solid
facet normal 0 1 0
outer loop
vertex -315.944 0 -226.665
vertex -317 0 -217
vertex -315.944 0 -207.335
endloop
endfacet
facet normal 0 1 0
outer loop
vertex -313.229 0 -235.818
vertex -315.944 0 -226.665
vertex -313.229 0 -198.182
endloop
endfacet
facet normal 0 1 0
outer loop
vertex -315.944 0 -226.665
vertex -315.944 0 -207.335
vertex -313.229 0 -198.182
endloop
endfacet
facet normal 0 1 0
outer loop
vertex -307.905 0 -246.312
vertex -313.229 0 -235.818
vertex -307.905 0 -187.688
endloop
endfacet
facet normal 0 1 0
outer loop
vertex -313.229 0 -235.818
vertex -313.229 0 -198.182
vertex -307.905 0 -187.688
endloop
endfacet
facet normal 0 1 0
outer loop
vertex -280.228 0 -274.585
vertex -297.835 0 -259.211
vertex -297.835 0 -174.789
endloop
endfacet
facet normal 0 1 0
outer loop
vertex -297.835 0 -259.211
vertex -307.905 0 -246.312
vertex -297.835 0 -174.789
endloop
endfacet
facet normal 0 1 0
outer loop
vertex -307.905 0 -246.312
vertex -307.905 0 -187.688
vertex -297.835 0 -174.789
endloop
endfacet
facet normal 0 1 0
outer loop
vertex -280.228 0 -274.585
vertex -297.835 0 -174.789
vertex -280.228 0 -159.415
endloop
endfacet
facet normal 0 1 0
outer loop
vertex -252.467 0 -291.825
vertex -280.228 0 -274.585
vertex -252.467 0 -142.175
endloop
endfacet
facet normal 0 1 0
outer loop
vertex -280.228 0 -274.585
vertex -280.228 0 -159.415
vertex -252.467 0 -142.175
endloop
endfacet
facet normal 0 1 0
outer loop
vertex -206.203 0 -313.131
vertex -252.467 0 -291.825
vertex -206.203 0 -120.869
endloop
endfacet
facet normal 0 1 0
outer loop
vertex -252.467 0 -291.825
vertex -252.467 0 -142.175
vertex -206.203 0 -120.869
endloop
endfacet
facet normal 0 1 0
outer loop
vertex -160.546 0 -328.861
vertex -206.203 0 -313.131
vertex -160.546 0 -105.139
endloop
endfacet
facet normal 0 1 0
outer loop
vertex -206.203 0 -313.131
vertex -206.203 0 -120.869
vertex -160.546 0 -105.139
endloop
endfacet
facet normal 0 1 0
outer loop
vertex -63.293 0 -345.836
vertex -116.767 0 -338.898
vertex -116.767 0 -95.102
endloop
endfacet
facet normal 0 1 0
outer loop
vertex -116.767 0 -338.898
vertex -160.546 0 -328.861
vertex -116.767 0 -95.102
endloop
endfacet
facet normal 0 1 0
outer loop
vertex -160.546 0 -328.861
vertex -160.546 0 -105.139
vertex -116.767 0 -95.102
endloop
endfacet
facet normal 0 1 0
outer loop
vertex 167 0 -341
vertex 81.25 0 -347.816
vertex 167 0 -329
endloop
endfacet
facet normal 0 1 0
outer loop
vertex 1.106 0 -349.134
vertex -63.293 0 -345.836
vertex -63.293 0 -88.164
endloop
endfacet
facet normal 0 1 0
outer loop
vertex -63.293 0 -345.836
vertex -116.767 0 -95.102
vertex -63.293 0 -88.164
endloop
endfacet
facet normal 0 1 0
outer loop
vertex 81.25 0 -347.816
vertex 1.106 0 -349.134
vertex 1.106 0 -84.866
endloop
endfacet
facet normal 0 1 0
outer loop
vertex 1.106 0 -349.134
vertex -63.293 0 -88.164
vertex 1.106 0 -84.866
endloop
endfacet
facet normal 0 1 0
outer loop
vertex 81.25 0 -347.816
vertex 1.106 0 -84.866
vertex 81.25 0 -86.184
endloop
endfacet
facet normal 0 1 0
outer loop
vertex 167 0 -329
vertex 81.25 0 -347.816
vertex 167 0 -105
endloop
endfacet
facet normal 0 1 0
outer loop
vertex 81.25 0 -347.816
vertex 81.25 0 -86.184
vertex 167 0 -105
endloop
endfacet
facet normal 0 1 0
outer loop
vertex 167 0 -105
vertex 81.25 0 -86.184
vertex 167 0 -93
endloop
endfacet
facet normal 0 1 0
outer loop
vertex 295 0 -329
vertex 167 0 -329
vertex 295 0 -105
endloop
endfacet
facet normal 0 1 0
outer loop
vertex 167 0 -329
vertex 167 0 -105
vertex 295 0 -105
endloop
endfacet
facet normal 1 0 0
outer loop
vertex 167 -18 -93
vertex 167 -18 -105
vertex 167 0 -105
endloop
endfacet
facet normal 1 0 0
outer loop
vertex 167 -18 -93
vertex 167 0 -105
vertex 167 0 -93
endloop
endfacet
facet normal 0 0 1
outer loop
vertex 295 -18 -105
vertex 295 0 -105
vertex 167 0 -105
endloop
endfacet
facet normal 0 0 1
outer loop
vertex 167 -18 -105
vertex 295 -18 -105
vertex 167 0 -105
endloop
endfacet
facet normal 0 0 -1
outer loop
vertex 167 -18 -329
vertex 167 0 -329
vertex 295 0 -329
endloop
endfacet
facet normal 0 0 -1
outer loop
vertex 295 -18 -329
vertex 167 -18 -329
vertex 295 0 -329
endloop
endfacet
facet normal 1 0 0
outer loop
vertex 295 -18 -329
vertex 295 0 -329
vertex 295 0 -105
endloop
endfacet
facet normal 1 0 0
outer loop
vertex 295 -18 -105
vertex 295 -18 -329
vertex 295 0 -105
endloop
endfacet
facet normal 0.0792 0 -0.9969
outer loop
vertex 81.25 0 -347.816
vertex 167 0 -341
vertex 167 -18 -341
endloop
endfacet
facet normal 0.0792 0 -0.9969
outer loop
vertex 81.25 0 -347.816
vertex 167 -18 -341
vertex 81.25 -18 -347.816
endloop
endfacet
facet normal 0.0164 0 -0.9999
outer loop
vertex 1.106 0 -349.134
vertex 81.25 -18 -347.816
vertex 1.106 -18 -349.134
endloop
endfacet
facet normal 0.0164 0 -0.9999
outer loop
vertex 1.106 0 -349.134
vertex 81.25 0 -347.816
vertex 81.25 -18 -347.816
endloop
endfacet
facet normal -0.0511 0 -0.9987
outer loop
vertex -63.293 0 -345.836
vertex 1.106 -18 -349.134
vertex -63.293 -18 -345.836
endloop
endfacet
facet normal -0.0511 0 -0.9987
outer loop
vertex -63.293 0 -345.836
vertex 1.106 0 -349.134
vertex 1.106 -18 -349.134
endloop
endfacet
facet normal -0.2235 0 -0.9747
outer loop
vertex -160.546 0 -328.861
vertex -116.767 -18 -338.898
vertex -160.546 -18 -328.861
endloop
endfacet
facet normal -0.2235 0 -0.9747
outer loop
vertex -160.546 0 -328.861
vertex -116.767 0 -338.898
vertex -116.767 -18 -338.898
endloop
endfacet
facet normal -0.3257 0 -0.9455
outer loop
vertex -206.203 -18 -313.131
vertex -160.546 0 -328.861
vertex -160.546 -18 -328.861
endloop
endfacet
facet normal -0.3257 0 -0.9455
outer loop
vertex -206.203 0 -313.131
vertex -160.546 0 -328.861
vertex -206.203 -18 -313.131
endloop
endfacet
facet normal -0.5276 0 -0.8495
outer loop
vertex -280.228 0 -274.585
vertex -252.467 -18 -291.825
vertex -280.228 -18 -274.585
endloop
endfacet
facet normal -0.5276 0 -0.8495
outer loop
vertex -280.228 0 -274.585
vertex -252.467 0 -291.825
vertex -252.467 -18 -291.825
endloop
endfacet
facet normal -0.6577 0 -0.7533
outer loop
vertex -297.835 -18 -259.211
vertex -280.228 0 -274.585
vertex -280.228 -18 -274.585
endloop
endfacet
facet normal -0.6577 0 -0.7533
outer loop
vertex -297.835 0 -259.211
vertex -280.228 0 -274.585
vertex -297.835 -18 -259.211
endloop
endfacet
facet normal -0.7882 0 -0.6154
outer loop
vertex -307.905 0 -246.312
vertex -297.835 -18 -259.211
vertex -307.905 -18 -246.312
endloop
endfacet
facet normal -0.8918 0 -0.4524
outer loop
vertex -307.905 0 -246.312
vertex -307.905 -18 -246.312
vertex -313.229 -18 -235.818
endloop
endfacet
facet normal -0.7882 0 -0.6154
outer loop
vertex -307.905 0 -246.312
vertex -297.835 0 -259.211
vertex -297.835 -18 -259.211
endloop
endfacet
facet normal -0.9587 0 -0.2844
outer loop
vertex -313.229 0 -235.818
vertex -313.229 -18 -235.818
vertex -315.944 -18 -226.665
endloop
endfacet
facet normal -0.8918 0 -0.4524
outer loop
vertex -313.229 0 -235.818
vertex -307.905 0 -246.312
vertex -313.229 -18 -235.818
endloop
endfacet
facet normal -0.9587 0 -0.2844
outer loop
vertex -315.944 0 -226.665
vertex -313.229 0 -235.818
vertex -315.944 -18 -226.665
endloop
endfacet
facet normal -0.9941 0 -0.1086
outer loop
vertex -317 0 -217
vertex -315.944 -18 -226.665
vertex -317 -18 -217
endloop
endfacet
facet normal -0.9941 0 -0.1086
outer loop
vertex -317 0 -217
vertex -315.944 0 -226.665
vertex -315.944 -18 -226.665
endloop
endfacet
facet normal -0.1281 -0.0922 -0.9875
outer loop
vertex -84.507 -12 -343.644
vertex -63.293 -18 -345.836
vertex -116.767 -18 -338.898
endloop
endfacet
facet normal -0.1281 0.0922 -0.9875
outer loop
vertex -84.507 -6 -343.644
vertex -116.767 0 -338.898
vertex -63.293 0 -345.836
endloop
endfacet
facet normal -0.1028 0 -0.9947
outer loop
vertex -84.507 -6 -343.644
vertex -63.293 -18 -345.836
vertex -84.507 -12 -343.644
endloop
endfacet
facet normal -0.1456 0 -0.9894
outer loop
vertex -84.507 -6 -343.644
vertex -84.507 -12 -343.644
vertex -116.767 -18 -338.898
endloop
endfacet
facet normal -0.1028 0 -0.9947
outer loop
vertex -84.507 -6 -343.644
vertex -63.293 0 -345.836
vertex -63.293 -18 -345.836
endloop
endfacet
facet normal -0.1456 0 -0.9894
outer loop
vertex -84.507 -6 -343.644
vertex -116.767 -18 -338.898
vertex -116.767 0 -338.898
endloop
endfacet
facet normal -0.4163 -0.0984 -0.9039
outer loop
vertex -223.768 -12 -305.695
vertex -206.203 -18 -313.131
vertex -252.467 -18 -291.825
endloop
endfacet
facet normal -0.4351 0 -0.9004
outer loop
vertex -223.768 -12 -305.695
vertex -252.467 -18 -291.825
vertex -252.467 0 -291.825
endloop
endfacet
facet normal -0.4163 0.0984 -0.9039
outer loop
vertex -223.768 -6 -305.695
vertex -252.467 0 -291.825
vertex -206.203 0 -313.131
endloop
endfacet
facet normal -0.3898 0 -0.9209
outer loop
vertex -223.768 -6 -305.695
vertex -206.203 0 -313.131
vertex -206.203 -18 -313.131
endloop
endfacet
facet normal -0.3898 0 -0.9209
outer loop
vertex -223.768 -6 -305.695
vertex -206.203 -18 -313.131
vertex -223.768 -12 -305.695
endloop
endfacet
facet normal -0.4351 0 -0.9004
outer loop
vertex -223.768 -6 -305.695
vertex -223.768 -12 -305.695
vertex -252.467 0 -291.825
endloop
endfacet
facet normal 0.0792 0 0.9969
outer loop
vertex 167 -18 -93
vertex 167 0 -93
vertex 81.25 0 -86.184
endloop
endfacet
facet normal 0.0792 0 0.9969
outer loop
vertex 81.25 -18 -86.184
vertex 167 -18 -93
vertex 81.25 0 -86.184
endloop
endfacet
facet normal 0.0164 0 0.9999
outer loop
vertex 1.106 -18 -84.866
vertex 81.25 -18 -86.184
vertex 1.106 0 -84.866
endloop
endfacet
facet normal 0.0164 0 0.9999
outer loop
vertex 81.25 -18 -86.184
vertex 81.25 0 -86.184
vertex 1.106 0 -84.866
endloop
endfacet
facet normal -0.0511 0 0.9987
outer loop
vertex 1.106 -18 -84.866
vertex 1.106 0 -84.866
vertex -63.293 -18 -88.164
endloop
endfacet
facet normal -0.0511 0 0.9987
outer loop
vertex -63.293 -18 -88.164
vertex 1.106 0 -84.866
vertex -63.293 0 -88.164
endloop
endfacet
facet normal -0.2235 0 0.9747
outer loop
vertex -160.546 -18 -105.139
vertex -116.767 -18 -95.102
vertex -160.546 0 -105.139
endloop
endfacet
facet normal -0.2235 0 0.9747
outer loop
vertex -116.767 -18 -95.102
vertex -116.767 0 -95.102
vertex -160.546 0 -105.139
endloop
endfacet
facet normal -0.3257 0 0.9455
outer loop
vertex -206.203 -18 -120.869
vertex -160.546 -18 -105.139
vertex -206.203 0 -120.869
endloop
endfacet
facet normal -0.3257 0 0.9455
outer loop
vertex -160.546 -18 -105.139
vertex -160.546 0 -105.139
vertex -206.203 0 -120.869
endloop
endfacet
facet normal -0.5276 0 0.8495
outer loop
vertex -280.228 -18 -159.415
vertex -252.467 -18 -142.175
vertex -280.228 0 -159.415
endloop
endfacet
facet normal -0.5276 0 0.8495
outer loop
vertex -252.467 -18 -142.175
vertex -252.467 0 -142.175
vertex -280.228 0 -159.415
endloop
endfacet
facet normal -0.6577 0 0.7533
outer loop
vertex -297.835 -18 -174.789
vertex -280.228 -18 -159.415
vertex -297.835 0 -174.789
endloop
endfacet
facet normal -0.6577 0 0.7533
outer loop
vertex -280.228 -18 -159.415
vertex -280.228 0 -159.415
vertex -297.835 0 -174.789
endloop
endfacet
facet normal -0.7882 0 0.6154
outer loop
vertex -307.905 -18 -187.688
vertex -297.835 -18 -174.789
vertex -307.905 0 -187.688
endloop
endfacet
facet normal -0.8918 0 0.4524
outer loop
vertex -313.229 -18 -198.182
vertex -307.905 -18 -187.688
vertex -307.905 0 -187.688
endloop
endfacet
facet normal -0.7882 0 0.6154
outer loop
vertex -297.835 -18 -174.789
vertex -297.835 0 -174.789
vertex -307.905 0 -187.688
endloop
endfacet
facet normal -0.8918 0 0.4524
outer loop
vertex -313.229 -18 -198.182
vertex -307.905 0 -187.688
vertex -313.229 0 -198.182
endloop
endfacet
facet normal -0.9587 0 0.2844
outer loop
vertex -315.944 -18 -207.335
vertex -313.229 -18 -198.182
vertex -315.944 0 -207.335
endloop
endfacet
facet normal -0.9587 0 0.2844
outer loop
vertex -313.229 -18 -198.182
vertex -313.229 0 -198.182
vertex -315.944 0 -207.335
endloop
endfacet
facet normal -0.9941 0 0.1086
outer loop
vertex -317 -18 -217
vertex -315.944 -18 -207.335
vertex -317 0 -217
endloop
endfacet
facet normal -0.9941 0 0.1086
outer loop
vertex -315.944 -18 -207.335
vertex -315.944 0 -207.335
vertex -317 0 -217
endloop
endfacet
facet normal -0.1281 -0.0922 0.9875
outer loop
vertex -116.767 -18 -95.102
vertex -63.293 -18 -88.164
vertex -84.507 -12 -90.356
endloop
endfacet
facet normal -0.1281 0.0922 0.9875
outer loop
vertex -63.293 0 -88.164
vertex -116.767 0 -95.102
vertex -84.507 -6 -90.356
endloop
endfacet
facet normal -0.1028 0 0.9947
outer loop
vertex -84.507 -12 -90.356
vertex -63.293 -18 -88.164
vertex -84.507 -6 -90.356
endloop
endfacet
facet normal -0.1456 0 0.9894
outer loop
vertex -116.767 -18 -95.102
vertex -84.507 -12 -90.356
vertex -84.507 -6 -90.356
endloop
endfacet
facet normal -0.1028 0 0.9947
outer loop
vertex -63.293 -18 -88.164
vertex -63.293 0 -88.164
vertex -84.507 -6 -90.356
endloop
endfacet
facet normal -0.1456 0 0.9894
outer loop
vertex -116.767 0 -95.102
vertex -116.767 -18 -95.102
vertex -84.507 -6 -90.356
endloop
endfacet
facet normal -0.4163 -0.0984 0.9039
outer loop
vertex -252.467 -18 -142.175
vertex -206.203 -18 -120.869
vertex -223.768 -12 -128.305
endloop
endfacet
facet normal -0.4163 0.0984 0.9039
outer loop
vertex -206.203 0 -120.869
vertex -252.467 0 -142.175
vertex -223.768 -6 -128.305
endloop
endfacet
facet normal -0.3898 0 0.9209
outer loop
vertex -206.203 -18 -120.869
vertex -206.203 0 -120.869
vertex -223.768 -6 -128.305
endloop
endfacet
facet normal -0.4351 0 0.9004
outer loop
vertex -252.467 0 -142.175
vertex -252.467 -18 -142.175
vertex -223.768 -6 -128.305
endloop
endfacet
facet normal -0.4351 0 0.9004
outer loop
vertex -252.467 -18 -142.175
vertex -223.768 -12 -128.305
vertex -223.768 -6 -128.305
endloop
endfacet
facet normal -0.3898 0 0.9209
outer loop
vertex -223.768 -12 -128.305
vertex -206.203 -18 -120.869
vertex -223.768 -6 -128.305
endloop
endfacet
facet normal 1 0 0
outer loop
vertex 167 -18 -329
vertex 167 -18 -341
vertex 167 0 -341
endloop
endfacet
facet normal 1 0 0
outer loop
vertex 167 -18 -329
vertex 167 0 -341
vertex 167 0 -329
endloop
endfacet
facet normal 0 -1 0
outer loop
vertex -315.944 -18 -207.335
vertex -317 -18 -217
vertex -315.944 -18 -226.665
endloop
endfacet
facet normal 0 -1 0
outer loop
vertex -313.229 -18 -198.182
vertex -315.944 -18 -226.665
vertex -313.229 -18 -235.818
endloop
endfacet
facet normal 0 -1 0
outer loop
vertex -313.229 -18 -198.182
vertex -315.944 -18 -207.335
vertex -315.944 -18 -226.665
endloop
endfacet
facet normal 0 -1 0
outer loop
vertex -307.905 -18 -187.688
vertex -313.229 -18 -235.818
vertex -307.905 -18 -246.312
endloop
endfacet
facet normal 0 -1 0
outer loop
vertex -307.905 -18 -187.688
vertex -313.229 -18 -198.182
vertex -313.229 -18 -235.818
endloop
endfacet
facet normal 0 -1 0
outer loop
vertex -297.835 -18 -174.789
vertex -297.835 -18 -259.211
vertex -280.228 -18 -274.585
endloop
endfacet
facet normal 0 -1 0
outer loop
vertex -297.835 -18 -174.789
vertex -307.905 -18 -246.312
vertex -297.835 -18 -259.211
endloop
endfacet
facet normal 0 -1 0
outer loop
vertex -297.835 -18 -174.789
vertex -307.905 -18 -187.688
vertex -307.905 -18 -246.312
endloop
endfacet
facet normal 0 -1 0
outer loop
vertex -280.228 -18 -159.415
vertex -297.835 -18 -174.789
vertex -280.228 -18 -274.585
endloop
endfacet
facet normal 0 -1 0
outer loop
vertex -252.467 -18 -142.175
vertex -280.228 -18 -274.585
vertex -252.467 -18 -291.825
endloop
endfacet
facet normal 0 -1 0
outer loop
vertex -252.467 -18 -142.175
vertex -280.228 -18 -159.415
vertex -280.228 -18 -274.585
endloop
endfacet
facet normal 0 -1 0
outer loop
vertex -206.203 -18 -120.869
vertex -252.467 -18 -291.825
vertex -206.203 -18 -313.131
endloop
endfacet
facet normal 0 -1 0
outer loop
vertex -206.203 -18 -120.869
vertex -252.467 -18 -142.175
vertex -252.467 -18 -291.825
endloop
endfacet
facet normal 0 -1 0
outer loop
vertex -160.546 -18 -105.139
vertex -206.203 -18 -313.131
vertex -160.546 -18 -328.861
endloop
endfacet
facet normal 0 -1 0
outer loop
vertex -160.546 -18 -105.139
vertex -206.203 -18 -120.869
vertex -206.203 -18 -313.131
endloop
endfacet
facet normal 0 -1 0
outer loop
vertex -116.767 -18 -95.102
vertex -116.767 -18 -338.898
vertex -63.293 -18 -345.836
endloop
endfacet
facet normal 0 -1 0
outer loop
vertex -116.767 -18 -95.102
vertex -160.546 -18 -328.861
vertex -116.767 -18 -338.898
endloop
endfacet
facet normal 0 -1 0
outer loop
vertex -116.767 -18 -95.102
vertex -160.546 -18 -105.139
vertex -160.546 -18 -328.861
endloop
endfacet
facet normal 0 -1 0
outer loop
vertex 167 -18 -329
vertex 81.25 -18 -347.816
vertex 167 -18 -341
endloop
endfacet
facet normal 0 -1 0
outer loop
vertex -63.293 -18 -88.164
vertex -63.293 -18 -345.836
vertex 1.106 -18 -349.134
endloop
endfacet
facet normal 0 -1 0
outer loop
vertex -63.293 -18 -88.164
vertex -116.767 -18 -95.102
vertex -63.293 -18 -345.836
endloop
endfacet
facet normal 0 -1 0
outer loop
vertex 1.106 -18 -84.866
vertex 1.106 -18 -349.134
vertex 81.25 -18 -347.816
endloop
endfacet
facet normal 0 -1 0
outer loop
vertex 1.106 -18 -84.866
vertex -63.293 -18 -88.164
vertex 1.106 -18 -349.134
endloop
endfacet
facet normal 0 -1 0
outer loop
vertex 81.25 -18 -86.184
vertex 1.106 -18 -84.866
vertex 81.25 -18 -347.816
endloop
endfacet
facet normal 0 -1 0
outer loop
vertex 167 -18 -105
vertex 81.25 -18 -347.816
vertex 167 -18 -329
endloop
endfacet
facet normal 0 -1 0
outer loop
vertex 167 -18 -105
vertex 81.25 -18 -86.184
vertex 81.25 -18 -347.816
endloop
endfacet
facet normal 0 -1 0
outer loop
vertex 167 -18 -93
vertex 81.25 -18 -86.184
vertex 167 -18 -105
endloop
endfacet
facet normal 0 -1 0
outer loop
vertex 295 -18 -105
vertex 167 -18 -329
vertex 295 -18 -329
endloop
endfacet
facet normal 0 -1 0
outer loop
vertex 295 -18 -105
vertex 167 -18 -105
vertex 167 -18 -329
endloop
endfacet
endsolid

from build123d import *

# Parameters (mm, degrees)
F1_DEPTH = 18


with BuildPart() as f1:
    # F0 (on Front) → F1 (new body)
    with BuildSketch(Plane.XZ):
        with BuildLine():
            Line((295, -217), (-317, -217))
            add(Edge.make_bspline(
                [(167, -341), (73.2052326202, -351.3030406237), (-82.9134855426, -352.2458970512), (-215.8919105735, -315.6215987583), (-316.2735343339, -258.65300402), (-317, -217)],
                knots=[0, 0, 0, 0, 0.4043982891, 0.7107448428, 1, 1, 1, 1], degree=3))
            Line((167, -341), (167, -329))
            Line((167, -329), (295, -329))
            Line((295, -329), (295, -217))
        make_face()
        with BuildLine():
            add(Edge.make_bspline(
                [(167, -93), (73.2052326202, -82.6969593763), (-82.9134855426, -81.7541029488), (-215.8919105735, -118.3784012417), (-316.2735343339, -175.34699598), (-317, -217)],
                knots=[0, 0, 0, 0, 0.4043982891, 0.7107448428, 1, 1, 1, 1], degree=3))
            Line((-317, -217), (295, -217))
            Line((295, -217), (295, -105))
            Line((295, -105), (167, -105))
            Line((167, -105), (167, -93))
        make_face()
    extrude(amount=F1_DEPTH)


solid = f1.part
